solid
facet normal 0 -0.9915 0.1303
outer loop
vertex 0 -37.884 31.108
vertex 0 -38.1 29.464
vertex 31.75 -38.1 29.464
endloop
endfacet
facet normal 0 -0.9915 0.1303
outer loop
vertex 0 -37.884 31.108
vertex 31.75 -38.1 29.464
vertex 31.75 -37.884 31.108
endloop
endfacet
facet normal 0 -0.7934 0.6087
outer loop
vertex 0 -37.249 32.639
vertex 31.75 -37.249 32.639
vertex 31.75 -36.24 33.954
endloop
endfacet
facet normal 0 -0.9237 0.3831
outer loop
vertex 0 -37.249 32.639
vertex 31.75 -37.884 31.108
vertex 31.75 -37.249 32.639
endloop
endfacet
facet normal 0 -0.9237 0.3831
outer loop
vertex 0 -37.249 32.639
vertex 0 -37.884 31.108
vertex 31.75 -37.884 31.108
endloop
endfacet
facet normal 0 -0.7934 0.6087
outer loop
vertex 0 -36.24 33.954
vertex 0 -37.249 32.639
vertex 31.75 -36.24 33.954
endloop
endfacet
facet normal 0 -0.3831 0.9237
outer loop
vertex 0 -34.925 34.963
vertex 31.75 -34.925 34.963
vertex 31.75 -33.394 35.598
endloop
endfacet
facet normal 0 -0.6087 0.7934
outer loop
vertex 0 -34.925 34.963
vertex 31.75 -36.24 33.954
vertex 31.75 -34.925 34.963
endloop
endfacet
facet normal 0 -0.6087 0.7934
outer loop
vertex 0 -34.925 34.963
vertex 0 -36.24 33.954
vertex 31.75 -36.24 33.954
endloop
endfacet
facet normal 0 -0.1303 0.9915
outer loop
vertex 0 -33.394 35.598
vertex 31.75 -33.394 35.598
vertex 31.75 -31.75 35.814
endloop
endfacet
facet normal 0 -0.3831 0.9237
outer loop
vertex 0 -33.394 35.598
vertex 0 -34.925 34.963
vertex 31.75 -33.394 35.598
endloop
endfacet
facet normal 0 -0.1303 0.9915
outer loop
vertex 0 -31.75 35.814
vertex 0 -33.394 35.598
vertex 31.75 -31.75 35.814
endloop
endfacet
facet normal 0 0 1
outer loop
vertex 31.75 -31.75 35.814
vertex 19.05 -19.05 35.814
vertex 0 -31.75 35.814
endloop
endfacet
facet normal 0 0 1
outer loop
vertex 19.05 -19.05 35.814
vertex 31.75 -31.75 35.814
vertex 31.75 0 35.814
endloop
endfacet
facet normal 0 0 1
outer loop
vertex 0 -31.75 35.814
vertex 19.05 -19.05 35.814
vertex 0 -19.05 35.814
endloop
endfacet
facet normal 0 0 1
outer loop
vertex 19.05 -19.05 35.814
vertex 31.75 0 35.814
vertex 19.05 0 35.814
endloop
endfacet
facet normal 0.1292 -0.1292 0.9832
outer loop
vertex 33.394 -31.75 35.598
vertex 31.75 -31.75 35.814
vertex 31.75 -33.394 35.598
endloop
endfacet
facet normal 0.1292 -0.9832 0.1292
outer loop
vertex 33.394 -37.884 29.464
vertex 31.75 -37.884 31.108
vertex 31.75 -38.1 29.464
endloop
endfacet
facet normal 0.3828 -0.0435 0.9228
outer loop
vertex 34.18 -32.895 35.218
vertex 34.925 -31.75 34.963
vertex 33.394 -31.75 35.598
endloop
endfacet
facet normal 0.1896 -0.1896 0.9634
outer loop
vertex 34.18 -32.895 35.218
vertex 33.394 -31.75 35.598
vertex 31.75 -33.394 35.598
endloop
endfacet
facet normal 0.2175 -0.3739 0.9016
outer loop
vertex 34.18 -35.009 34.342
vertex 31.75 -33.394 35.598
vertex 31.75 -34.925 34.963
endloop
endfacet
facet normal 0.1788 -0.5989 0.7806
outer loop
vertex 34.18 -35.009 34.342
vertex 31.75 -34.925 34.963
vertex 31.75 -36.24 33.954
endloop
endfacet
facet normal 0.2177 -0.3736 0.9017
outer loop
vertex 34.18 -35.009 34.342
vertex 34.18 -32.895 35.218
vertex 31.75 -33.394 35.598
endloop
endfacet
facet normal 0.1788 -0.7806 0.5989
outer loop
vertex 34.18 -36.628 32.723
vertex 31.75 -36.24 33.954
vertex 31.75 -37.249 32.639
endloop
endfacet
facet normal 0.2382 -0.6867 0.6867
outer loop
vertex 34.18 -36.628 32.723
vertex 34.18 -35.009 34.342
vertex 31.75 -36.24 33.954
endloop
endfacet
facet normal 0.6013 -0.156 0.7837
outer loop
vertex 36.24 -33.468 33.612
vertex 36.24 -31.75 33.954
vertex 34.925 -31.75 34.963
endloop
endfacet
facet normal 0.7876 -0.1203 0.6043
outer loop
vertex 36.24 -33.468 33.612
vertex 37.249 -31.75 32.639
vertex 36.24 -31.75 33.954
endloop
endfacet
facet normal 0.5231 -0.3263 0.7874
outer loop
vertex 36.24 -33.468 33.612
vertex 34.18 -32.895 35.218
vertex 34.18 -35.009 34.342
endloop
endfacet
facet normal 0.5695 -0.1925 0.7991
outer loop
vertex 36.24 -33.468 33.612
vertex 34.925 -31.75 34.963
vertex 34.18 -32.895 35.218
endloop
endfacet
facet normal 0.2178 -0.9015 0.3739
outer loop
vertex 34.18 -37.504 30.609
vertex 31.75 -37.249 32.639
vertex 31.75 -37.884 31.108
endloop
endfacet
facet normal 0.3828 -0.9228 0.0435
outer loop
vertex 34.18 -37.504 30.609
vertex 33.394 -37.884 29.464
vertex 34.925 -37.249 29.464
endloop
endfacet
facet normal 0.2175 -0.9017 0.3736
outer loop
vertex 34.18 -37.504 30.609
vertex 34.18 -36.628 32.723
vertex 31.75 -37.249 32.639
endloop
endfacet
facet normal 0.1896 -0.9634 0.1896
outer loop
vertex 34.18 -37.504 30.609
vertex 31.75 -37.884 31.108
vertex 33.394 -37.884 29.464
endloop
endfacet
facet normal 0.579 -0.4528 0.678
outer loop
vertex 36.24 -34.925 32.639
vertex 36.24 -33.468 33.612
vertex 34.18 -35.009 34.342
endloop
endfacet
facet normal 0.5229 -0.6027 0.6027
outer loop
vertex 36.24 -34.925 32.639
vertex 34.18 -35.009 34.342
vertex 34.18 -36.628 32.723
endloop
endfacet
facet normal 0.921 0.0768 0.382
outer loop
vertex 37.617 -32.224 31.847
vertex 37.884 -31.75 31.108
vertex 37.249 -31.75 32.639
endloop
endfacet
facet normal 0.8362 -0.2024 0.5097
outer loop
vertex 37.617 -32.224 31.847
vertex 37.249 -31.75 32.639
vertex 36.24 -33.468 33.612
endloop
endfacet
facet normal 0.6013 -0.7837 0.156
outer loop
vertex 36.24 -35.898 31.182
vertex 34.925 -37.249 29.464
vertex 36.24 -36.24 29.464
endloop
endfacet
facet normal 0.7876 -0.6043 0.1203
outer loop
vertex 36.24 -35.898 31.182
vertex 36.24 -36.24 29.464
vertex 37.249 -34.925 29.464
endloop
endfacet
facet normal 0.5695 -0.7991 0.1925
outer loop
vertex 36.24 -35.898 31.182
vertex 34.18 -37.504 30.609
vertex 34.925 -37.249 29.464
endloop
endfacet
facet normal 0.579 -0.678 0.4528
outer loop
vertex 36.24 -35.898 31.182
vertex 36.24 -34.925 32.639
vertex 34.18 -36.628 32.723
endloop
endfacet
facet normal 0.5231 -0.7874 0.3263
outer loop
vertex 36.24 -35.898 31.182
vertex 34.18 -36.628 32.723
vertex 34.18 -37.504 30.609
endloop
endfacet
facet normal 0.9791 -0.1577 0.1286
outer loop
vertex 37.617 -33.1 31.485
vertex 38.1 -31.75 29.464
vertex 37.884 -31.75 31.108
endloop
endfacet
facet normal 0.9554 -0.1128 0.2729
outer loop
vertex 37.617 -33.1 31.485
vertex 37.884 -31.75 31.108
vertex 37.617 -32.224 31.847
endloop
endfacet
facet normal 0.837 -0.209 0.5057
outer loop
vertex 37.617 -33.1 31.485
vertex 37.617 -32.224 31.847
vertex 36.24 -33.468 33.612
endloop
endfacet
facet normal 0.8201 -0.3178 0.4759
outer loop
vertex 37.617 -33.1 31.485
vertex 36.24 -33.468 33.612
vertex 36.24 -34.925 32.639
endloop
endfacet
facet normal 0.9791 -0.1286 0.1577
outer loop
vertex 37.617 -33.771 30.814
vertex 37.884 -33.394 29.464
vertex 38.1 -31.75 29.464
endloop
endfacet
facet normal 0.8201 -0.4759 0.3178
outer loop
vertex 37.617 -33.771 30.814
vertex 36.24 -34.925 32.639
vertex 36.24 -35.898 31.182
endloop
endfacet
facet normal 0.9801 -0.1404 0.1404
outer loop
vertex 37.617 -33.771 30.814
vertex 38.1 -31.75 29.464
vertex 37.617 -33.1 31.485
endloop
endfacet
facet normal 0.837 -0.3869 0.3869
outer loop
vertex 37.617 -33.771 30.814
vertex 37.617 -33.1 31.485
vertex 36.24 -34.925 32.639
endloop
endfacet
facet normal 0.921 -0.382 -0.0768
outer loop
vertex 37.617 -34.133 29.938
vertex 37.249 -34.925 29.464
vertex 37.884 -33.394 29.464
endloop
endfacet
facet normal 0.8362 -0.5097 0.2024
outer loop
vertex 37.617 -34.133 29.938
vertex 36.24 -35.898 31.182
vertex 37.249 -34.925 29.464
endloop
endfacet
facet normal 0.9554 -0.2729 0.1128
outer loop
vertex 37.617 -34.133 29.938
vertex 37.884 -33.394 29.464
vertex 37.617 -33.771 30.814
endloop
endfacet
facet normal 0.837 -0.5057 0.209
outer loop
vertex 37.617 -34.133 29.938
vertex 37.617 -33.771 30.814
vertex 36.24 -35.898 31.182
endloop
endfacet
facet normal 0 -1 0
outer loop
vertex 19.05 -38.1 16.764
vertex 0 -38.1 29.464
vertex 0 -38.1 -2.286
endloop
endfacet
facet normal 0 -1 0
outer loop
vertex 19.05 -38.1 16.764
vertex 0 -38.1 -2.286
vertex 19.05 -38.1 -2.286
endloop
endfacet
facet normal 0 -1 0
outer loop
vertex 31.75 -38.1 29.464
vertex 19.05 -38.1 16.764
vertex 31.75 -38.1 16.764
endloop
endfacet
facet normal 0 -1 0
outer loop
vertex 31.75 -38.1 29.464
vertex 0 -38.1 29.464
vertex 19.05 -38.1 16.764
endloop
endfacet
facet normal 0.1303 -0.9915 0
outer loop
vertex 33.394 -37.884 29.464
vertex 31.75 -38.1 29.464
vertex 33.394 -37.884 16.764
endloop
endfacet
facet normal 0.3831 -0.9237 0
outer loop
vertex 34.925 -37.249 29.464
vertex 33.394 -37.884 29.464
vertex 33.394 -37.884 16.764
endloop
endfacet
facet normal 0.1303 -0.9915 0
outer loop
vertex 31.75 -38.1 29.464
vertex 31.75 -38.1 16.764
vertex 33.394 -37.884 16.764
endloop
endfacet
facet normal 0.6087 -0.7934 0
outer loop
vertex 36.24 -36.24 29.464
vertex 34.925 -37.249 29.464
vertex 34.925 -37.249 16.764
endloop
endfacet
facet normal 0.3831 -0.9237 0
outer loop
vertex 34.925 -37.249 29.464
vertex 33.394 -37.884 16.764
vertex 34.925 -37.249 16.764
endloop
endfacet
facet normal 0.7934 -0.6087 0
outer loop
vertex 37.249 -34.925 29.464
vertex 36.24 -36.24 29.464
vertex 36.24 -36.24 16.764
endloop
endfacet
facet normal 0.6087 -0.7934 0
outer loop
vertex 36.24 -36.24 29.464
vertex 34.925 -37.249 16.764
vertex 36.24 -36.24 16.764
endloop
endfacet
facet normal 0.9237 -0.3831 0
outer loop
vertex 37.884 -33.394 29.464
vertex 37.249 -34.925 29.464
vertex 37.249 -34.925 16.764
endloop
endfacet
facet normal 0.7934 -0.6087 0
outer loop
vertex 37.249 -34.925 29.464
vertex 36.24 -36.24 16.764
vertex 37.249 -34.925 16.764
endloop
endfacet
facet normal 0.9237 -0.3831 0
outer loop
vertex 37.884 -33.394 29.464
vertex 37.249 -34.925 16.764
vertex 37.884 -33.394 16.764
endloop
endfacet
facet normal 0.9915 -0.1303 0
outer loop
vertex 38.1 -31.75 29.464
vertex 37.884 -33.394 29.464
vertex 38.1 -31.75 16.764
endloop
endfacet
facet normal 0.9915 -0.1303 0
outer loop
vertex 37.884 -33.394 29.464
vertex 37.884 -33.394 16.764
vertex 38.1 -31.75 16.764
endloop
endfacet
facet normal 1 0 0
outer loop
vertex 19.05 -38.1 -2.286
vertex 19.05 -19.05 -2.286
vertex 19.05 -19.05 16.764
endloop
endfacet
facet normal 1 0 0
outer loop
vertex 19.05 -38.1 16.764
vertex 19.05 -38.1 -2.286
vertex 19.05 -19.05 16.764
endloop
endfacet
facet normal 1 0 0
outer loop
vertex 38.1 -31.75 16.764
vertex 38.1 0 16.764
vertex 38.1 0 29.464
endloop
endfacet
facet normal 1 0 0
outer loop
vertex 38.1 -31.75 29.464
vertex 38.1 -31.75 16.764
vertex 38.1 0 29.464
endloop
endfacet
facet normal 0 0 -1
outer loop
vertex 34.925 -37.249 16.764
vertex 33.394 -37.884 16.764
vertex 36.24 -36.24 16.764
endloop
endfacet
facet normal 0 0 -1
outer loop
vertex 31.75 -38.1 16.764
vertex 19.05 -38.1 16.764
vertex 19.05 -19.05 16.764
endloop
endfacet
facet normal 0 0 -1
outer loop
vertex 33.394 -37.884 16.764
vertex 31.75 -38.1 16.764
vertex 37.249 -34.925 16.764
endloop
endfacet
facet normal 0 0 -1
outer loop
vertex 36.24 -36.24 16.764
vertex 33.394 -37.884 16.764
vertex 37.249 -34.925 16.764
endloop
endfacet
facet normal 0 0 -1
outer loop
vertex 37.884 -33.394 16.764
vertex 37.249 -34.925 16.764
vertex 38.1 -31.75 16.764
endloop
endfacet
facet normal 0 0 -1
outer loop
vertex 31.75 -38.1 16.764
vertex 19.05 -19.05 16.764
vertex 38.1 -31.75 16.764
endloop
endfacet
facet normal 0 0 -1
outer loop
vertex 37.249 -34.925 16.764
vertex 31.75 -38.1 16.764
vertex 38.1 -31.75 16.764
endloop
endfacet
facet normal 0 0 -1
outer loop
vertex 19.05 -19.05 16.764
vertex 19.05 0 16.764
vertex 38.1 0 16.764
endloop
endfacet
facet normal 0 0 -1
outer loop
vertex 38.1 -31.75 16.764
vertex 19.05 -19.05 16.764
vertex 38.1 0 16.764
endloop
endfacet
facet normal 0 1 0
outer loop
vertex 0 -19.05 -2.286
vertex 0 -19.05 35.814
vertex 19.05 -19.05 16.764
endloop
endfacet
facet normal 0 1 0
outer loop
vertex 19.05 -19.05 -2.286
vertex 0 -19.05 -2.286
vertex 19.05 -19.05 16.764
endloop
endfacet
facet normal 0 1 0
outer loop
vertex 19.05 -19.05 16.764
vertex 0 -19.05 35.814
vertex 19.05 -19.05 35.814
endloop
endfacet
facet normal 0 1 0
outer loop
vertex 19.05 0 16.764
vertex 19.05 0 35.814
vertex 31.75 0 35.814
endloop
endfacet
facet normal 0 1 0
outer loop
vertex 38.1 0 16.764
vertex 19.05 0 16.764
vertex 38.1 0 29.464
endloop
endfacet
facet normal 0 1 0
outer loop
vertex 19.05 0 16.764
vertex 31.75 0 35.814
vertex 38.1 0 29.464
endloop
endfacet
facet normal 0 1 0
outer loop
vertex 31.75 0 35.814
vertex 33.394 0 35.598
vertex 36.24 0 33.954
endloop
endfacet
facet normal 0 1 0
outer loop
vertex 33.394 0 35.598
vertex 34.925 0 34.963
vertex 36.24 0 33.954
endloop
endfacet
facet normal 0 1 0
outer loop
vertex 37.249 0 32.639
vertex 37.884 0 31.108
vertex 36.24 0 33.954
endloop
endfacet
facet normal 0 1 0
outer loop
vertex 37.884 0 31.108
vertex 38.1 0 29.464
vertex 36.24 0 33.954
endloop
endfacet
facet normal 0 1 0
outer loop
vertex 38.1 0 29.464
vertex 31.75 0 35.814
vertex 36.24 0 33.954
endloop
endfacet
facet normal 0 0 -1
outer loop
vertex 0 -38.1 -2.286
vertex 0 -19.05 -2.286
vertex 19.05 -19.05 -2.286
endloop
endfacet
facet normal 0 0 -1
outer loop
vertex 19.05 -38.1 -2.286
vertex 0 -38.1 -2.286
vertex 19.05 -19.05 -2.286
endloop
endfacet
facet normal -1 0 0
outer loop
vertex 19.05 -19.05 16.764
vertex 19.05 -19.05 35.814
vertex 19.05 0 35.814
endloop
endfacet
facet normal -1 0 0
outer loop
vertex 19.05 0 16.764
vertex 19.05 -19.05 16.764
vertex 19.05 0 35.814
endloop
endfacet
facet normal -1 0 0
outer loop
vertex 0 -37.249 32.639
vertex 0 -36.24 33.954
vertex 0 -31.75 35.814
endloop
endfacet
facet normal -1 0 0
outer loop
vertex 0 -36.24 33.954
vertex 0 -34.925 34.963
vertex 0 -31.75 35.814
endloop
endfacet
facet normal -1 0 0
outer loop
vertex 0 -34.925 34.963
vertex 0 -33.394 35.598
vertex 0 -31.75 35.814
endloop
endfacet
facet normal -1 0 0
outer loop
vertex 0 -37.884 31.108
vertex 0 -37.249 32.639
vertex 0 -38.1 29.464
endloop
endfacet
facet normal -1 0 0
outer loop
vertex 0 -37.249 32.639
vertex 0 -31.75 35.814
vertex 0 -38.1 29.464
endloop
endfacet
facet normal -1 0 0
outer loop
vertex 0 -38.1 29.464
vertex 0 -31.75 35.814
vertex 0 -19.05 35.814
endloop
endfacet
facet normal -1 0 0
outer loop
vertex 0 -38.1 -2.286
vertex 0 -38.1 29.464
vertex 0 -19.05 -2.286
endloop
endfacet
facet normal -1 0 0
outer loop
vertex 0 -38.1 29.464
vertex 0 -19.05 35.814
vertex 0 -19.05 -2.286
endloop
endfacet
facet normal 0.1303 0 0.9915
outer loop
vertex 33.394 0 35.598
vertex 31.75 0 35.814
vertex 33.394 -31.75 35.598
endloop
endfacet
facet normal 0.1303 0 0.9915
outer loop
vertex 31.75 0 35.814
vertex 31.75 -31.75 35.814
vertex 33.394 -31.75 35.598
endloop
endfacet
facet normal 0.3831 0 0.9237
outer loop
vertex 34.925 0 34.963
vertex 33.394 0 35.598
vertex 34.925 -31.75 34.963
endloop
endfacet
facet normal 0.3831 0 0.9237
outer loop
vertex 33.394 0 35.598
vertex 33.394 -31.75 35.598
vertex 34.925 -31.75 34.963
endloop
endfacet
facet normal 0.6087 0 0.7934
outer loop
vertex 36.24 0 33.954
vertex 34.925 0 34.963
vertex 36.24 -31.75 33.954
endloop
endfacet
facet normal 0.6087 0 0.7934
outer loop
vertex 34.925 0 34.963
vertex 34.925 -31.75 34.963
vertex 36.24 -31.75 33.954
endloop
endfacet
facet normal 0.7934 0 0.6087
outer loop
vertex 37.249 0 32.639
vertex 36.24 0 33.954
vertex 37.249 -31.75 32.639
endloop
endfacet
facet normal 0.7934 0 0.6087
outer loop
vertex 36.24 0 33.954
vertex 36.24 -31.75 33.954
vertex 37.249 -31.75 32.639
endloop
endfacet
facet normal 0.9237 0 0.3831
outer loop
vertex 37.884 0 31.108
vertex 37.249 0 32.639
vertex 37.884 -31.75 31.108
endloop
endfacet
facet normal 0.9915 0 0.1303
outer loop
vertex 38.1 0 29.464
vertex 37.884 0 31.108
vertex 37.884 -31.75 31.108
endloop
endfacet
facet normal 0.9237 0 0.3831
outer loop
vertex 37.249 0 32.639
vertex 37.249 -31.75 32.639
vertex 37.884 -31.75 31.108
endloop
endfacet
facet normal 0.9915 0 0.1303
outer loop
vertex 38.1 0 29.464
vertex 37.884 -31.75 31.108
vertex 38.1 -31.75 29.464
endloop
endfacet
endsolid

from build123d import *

# Parameters (mm, degrees)
F1_DEPTH = 38.1
F2_W     = 19.05
F2_H     = 19.05
F3_DEPTH = 38.101
F4_R     = 6.35
F5_R     = 6.35


with BuildPart() as f1:
    # F0 (on Front) → F1 (new body)
    with BuildSketch(Plane.XZ):
        Polygon((0, 35.814), (0, -2.286), (19.05, -2.286), (19.05, 16.764), (38.1, 16.764), (38.1, 35.814), align=None)
    extrude(amount=F1_DEPTH)

    # F2 (on face) → F3 (cut, through all)
    with BuildSketch(Plane.XY.offset(35.814)):
        with Locations((9.525, -9.525)):
            Rectangle(F2_W, F2_H)
    extrude(amount=-F3_DEPTH, mode=Mode.SUBTRACT)

    # F4
    f4_edges = [f1.edges().sort_by_distance(p)[0] for p in [
        (19.05, -38.1, 35.814),
    ]]
    fillet(f4_edges, radius=F4_R)

    # F5
    f5_edges = [f1.edges().sort_by_distance(p)[0] for p in [
        (38.1, -15.875, 35.814),
    ]]
    fillet(f5_edges, radius=F5_R)


solid = f1.part
